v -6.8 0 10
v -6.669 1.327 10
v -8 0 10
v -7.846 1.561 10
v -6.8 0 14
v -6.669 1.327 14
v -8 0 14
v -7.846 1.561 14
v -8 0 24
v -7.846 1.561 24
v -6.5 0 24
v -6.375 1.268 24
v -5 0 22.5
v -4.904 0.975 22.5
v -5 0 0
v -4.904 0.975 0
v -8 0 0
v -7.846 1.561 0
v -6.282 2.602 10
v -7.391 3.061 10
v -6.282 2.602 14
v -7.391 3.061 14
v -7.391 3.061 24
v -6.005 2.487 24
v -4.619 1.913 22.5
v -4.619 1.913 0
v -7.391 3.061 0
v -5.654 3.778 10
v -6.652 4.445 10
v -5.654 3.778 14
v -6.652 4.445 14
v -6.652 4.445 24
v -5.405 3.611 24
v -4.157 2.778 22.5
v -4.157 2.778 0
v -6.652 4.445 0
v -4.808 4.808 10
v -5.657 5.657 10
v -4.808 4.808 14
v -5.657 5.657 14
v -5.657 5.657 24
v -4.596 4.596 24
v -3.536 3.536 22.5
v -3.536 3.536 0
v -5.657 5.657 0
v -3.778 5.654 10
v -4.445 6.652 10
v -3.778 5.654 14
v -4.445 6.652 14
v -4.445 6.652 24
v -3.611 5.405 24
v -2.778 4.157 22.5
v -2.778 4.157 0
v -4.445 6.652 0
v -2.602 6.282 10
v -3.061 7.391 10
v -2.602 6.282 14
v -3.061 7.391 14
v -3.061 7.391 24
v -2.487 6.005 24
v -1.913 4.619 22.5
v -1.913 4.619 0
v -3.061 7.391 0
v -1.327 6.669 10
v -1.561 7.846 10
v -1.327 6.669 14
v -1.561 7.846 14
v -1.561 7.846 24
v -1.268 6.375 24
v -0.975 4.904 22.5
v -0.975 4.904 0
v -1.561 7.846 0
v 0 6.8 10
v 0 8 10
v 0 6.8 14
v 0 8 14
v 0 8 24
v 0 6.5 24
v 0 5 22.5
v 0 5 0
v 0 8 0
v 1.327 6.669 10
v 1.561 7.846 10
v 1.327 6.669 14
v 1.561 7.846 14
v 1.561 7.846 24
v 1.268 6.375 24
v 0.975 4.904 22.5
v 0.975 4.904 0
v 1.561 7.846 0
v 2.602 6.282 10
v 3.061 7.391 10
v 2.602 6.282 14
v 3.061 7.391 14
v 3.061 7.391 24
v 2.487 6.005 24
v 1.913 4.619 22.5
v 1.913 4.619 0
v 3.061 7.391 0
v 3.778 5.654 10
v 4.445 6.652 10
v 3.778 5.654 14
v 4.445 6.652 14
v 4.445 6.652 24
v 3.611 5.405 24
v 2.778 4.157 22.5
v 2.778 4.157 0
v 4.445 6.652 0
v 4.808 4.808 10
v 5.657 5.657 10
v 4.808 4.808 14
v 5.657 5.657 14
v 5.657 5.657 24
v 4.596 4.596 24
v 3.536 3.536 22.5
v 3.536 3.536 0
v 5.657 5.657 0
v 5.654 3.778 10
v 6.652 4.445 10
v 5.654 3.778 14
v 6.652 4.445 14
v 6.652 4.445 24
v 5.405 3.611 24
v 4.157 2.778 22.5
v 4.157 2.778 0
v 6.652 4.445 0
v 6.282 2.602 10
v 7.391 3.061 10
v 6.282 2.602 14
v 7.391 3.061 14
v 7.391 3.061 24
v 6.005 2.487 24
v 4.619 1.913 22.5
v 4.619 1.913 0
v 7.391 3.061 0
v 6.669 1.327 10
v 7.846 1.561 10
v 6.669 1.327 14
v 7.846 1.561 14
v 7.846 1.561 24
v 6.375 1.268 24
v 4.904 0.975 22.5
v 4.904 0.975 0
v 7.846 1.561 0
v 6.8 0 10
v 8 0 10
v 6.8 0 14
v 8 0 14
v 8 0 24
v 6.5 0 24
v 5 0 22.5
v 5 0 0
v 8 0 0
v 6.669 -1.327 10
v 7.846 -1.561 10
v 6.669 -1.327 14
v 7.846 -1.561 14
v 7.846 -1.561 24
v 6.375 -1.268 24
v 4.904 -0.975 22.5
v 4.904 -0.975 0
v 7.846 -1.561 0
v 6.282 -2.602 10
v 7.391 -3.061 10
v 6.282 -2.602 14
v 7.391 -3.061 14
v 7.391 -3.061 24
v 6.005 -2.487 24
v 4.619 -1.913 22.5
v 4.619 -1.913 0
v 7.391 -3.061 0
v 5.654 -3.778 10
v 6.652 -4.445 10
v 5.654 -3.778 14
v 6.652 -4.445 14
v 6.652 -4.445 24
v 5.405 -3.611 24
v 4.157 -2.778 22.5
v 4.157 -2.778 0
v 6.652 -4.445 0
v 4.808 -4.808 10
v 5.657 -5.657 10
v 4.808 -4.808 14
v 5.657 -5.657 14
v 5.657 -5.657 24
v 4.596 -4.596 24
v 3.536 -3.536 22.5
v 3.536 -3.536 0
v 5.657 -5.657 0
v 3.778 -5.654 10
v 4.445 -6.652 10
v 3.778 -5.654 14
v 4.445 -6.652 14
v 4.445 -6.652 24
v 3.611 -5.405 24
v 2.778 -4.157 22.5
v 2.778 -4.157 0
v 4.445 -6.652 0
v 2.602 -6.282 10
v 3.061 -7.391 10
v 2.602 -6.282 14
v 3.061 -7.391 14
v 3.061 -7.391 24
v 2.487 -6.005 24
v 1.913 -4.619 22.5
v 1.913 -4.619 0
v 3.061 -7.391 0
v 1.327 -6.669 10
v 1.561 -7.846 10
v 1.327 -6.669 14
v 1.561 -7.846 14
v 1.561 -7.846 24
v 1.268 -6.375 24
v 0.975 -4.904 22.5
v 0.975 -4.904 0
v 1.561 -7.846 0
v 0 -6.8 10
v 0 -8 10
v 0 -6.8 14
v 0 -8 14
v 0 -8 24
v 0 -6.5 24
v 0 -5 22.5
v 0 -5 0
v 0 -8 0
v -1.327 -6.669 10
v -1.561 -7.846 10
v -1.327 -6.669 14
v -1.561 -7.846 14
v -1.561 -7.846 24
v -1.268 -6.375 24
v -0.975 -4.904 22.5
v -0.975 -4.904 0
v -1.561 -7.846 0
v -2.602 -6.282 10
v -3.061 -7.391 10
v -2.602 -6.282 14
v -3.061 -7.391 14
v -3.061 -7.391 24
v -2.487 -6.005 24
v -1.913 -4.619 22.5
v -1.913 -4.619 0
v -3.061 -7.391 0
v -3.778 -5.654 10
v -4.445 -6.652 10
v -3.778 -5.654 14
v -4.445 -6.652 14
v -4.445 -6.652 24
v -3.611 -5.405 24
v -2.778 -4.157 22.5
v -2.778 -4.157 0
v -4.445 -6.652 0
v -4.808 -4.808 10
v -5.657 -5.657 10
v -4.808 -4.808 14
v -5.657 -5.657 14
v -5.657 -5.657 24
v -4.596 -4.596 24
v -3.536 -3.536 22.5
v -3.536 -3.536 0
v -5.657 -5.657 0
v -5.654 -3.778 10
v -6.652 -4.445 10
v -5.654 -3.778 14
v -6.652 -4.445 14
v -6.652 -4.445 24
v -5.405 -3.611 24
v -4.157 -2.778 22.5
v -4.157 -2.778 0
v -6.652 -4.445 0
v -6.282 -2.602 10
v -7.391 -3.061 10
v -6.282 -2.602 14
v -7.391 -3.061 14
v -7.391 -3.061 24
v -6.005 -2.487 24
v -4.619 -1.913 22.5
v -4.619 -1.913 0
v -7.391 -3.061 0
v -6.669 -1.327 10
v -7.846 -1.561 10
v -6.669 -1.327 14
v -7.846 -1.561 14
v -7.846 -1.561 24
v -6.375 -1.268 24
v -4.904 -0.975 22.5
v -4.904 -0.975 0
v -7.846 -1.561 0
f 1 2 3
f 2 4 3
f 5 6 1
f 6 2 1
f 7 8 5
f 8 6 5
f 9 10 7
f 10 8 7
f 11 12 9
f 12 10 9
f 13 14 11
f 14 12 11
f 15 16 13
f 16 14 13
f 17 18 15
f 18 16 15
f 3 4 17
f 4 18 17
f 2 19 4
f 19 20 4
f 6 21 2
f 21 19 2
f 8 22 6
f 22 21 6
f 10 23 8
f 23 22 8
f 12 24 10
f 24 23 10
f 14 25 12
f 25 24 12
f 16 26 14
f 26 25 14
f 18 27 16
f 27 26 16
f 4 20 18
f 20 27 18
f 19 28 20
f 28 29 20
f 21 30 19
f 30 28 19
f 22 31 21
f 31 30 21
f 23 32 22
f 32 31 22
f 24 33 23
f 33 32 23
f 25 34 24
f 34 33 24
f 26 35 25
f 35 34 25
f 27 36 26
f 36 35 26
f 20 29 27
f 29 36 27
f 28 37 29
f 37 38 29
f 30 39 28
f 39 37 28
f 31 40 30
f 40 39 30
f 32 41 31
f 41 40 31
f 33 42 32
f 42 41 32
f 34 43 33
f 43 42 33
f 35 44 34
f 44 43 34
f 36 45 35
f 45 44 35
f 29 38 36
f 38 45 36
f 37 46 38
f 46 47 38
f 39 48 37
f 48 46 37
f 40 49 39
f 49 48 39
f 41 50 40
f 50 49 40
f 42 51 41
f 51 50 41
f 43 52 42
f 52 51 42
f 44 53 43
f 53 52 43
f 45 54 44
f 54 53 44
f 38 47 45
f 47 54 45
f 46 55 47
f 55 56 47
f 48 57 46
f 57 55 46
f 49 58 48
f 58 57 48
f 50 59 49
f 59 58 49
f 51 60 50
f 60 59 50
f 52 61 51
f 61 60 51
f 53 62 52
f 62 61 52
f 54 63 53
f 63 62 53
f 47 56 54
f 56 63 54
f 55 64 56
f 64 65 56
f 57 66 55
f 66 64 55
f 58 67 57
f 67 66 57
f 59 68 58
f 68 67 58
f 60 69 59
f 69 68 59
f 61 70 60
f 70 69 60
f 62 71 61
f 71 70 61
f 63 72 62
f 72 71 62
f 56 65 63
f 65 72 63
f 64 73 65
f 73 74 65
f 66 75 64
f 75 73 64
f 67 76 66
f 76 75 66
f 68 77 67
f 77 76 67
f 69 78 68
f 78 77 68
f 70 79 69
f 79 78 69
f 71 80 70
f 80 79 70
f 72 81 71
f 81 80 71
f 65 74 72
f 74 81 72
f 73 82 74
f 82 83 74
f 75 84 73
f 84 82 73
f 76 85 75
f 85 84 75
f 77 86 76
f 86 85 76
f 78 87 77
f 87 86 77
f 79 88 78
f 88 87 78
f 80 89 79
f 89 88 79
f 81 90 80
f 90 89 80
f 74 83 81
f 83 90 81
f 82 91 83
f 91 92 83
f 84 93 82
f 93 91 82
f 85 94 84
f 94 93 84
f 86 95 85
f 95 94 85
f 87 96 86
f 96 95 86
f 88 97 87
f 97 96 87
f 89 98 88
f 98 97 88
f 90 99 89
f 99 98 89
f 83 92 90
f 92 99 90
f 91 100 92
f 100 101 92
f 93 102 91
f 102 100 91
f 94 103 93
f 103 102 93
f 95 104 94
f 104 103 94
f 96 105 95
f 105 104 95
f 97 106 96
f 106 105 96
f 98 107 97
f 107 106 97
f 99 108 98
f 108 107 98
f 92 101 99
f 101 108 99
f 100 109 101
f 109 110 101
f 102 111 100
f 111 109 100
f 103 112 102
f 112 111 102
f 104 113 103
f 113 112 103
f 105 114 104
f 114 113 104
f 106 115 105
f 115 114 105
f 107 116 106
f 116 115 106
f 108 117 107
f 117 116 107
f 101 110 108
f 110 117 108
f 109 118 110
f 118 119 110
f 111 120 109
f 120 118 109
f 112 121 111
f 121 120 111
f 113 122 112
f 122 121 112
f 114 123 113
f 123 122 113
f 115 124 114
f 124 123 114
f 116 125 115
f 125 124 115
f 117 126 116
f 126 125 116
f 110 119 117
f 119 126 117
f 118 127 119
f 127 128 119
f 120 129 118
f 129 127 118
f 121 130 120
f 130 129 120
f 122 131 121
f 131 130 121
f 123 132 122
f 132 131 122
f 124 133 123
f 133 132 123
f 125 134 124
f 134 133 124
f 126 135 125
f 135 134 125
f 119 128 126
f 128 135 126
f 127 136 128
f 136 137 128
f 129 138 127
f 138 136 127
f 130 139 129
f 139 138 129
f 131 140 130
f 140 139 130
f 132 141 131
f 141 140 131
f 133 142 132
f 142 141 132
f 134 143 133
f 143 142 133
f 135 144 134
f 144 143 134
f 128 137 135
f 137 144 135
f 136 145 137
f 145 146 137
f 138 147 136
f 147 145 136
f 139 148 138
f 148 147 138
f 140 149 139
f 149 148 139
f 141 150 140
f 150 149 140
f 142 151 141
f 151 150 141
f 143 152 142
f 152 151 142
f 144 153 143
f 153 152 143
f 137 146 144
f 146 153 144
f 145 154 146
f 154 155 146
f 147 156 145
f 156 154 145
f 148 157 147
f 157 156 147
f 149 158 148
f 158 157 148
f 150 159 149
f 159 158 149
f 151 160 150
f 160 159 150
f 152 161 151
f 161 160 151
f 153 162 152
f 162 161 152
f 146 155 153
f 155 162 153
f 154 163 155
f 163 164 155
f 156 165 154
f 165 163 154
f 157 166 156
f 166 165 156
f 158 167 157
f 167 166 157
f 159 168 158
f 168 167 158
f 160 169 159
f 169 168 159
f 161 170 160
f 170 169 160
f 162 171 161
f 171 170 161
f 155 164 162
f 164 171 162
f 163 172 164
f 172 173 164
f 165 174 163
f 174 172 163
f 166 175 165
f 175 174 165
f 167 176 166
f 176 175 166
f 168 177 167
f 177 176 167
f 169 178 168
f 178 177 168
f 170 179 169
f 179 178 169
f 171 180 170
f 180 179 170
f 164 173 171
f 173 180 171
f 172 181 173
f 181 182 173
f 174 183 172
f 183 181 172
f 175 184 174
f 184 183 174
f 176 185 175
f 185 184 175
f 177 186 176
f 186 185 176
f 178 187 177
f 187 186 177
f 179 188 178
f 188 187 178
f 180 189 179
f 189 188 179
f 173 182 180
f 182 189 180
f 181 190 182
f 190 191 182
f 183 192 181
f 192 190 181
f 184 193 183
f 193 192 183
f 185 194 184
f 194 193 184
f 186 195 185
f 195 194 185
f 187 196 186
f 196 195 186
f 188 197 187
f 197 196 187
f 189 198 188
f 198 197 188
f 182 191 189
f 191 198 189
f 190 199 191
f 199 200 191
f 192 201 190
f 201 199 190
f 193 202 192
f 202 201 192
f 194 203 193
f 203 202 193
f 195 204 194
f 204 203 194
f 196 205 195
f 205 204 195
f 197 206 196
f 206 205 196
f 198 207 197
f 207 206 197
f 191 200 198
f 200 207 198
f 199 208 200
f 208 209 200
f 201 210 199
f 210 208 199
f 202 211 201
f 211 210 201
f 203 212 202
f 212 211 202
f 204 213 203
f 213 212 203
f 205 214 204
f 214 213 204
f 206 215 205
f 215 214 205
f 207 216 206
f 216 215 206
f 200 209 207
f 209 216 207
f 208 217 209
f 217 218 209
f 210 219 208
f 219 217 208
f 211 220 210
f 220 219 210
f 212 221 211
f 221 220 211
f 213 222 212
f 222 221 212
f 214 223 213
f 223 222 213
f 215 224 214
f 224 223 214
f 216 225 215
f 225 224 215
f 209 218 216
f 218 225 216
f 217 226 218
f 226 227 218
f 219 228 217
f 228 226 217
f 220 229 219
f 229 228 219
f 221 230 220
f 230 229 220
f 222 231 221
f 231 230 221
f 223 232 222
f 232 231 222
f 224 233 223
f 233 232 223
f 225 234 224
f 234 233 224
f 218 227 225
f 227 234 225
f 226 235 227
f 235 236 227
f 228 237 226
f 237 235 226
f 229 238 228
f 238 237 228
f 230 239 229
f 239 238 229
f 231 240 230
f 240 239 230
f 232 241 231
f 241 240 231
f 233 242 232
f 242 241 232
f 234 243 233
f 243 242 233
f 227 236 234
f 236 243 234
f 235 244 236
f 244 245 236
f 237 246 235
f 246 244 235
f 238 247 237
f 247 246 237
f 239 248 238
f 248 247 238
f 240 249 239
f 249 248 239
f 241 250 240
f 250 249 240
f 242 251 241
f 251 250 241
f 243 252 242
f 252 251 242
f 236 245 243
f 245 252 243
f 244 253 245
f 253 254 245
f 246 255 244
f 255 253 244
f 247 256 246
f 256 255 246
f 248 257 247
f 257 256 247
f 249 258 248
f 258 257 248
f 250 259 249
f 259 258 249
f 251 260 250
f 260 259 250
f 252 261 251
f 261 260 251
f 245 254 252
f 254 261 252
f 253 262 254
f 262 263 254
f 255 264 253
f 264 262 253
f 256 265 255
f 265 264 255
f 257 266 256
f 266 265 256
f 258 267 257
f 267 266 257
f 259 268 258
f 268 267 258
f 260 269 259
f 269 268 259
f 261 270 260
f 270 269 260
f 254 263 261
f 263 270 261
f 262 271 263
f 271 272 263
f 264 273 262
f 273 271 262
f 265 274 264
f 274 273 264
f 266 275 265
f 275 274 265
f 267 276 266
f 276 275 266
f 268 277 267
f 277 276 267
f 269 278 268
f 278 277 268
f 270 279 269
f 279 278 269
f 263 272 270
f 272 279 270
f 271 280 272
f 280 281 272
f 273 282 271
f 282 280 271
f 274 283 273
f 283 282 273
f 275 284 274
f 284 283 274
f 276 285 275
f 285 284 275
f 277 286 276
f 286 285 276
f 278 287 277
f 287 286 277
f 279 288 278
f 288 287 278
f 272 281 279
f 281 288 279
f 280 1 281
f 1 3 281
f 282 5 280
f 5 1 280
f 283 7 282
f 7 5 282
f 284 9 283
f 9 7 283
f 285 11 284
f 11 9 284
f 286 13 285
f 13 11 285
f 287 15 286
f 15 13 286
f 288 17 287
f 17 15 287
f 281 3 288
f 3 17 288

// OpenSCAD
$fn = 32;

// ----------------------------------------------------------------------
// Grooved revolve: thread_relief, bore R5
// ----------------------------------------------------------------------

// --- parameters (mm) ---
bore_r = 5;               // bore radius
outer_r = 8;              // outer radius of the body
total_h = 24;             // overall height, Z
wall = 3;                 // radial wall thickness
groove_w = 4;             // groove width
groove_d = 1.2;           // groove depth
grooves = 1;              // number of outer grooves
relief = 1.5;             // thread relief leg at the bore mouth
relief_angle = 45;        // thread relief chamfer angle, degrees

bbox_x = 2 * outer_r;  // full diameter
bore_d = 2 * bore_r;  // bore diameter
body_d = 2 * outer_r;  // body diameter
revolve_angle = 360;  // full turn around the Z axis

profile = [[5, 0], [8, 0], [8, 10], [6.8, 10], [6.8, 14], [8, 14], [8, 24], [6.5, 24], [5, 22.5]];  // primary outline, 9 points, counter clockwise

// --- the one profile operation ---
rotate_extrude(angle = revolve_angle) polygon(points = profile);
